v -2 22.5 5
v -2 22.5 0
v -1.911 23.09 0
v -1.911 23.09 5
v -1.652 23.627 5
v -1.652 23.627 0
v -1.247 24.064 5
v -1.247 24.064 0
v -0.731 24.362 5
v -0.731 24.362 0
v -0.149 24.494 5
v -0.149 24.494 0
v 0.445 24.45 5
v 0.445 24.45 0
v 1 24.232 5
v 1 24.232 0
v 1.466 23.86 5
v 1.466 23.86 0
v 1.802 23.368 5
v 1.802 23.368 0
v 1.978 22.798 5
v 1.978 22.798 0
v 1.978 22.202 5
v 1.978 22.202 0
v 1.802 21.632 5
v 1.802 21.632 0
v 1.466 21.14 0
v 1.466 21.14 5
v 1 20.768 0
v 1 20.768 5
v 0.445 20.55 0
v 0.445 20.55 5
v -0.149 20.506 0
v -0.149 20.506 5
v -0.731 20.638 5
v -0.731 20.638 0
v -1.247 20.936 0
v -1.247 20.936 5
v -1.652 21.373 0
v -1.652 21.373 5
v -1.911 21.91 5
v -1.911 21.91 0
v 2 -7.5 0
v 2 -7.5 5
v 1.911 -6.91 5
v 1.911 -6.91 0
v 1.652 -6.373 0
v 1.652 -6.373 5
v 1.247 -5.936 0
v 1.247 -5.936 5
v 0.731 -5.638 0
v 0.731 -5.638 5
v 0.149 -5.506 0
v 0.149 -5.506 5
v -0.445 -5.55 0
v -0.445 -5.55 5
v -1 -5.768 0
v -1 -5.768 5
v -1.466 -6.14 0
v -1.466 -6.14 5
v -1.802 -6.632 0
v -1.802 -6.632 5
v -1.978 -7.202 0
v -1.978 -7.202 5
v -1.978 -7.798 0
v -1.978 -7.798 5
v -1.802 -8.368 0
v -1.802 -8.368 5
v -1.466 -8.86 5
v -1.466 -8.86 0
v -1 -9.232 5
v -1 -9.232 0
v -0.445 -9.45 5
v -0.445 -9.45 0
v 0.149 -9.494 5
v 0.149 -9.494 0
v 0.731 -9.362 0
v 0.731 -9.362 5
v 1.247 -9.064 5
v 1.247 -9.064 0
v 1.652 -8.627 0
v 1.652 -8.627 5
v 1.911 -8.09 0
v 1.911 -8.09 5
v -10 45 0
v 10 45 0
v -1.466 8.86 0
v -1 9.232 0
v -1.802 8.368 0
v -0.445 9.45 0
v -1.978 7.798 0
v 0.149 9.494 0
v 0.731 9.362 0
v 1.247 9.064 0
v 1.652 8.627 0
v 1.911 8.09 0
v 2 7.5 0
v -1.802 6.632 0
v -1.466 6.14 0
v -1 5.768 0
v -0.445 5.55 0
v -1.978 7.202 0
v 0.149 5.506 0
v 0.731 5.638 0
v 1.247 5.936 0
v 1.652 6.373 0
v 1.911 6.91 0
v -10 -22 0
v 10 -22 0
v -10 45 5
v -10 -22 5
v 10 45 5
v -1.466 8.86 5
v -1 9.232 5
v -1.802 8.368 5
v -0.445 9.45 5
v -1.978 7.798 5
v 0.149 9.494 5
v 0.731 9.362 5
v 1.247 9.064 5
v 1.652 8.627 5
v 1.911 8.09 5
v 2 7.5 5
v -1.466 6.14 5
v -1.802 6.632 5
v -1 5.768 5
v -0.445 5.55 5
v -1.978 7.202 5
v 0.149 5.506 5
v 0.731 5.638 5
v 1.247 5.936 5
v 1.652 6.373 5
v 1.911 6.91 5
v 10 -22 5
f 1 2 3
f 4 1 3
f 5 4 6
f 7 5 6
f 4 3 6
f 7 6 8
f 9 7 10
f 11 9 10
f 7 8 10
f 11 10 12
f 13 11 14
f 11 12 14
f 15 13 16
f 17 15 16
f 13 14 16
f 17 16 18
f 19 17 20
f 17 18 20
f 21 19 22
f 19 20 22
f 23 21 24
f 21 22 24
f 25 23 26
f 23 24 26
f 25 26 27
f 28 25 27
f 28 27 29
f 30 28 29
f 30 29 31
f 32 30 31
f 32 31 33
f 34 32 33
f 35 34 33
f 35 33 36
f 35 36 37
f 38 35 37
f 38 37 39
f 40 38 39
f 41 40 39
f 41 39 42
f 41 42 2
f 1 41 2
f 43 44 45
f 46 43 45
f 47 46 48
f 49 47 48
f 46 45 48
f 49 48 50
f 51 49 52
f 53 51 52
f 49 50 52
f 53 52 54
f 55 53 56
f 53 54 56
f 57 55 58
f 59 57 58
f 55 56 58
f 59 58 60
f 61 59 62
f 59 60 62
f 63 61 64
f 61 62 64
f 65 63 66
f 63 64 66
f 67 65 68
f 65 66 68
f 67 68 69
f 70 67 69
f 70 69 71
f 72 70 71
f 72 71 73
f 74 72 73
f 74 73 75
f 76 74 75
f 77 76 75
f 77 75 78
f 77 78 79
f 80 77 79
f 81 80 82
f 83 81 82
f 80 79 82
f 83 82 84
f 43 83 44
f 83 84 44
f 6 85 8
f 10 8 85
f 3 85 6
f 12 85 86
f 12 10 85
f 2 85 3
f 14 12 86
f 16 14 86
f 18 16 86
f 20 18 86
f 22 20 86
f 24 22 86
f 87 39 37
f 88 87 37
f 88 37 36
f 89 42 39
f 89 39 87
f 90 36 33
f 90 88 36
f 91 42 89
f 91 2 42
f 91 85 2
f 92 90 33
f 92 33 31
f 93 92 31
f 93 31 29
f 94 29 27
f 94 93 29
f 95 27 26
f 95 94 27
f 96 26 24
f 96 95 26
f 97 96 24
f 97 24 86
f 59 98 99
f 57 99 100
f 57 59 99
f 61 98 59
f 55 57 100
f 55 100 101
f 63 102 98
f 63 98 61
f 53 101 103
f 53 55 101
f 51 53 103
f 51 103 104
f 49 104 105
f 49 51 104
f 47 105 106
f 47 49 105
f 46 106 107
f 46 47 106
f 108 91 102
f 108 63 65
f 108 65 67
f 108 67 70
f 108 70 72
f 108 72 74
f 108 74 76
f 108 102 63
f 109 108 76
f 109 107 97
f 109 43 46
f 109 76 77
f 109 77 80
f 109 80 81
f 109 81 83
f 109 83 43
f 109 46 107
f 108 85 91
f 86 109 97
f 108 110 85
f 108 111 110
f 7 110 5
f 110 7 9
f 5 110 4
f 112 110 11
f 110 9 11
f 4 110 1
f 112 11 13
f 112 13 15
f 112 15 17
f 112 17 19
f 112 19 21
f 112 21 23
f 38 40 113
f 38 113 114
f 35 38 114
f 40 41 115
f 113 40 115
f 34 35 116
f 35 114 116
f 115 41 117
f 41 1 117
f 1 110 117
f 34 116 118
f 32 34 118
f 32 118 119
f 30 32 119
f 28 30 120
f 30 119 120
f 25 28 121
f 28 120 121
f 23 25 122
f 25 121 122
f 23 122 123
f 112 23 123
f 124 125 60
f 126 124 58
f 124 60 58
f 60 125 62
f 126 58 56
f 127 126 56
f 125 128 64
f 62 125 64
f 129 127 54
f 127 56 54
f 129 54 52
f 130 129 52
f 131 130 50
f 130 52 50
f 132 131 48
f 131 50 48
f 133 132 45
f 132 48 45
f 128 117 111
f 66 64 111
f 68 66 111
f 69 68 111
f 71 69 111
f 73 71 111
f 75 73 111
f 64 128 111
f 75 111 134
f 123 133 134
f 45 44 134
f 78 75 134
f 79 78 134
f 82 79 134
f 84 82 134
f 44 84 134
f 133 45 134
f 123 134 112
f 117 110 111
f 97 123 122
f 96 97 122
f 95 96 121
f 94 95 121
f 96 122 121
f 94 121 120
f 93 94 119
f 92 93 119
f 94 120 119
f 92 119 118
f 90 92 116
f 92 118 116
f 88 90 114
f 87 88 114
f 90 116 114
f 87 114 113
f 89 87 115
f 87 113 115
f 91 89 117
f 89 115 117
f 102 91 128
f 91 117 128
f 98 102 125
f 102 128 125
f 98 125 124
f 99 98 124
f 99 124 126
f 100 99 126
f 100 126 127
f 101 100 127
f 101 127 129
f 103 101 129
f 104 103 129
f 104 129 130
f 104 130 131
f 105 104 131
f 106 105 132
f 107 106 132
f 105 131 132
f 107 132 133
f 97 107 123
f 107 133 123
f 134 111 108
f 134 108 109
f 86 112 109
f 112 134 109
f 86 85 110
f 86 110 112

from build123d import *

# Parameters (mm, degrees)
SKETCH1_W           = 20
SKETCH1_H           = 30
BOSS_EXTRUDE1_DEPTH = 5
SKETCH2_R           = 2
CUT_EXTRUDE1_DEPTH  = 5
SKETCH3_W           = 20
SKETCH3_H           = 5
BOSS_EXTRUDE2_DEPTH = 7
SKETCH4_W           = 20
SKETCH4_H           = 5
BOSS_EXTRUDE3_DEPTH = 30
SKETCH5_R           = 2
CUT_EXTRUDE2_DEPTH  = 7


with BuildPart() as part:
    # Sketch1 → Boss-Extrude1 (new body)
    with BuildSketch(Plane.XY):
        Rectangle(SKETCH1_W, SKETCH1_H)
    extrude(amount=BOSS_EXTRUDE1_DEPTH)

    # Sketch2 → Cut-Extrude1 (cut)
    with BuildSketch(Plane.XY.offset(5)):
        with Locations((0, 7.5)):
            Circle(SKETCH2_R)
        with Locations((0, -7.5)):
            Circle(SKETCH2_R)
    extrude(amount=-CUT_EXTRUDE1_DEPTH, mode=Mode.SUBTRACT)

    # Sketch3 → Boss-Extrude2 (add)
    with BuildSketch(Plane.XZ.offset(15)):
        with Locations((0, 2.5)):
            Rectangle(SKETCH3_W, SKETCH3_H)
    extrude(amount=BOSS_EXTRUDE2_DEPTH)

    # Sketch4 → Boss-Extrude3 (add)
    with BuildSketch(Plane(origin=(0, 15, 0), x_dir=(1, 0, 0), z_dir=(0, 1, 0))):
        with Locations((0, -2.5)):
            Rectangle(SKETCH4_W, SKETCH4_H)
    extrude(amount=BOSS_EXTRUDE3_DEPTH)

    # Sketch5 → Cut-Extrude2 (cut)
    with BuildSketch(Plane(origin=(0, 0, 0), x_dir=(-1, 0, 0), z_dir=(0, 0, -1))):
        with Locations((0, 22.5)):
            Circle(SKETCH5_R)
    extrude(amount=-CUT_EXTRUDE2_DEPTH, mode=Mode.SUBTRACT)


solid = part.part
